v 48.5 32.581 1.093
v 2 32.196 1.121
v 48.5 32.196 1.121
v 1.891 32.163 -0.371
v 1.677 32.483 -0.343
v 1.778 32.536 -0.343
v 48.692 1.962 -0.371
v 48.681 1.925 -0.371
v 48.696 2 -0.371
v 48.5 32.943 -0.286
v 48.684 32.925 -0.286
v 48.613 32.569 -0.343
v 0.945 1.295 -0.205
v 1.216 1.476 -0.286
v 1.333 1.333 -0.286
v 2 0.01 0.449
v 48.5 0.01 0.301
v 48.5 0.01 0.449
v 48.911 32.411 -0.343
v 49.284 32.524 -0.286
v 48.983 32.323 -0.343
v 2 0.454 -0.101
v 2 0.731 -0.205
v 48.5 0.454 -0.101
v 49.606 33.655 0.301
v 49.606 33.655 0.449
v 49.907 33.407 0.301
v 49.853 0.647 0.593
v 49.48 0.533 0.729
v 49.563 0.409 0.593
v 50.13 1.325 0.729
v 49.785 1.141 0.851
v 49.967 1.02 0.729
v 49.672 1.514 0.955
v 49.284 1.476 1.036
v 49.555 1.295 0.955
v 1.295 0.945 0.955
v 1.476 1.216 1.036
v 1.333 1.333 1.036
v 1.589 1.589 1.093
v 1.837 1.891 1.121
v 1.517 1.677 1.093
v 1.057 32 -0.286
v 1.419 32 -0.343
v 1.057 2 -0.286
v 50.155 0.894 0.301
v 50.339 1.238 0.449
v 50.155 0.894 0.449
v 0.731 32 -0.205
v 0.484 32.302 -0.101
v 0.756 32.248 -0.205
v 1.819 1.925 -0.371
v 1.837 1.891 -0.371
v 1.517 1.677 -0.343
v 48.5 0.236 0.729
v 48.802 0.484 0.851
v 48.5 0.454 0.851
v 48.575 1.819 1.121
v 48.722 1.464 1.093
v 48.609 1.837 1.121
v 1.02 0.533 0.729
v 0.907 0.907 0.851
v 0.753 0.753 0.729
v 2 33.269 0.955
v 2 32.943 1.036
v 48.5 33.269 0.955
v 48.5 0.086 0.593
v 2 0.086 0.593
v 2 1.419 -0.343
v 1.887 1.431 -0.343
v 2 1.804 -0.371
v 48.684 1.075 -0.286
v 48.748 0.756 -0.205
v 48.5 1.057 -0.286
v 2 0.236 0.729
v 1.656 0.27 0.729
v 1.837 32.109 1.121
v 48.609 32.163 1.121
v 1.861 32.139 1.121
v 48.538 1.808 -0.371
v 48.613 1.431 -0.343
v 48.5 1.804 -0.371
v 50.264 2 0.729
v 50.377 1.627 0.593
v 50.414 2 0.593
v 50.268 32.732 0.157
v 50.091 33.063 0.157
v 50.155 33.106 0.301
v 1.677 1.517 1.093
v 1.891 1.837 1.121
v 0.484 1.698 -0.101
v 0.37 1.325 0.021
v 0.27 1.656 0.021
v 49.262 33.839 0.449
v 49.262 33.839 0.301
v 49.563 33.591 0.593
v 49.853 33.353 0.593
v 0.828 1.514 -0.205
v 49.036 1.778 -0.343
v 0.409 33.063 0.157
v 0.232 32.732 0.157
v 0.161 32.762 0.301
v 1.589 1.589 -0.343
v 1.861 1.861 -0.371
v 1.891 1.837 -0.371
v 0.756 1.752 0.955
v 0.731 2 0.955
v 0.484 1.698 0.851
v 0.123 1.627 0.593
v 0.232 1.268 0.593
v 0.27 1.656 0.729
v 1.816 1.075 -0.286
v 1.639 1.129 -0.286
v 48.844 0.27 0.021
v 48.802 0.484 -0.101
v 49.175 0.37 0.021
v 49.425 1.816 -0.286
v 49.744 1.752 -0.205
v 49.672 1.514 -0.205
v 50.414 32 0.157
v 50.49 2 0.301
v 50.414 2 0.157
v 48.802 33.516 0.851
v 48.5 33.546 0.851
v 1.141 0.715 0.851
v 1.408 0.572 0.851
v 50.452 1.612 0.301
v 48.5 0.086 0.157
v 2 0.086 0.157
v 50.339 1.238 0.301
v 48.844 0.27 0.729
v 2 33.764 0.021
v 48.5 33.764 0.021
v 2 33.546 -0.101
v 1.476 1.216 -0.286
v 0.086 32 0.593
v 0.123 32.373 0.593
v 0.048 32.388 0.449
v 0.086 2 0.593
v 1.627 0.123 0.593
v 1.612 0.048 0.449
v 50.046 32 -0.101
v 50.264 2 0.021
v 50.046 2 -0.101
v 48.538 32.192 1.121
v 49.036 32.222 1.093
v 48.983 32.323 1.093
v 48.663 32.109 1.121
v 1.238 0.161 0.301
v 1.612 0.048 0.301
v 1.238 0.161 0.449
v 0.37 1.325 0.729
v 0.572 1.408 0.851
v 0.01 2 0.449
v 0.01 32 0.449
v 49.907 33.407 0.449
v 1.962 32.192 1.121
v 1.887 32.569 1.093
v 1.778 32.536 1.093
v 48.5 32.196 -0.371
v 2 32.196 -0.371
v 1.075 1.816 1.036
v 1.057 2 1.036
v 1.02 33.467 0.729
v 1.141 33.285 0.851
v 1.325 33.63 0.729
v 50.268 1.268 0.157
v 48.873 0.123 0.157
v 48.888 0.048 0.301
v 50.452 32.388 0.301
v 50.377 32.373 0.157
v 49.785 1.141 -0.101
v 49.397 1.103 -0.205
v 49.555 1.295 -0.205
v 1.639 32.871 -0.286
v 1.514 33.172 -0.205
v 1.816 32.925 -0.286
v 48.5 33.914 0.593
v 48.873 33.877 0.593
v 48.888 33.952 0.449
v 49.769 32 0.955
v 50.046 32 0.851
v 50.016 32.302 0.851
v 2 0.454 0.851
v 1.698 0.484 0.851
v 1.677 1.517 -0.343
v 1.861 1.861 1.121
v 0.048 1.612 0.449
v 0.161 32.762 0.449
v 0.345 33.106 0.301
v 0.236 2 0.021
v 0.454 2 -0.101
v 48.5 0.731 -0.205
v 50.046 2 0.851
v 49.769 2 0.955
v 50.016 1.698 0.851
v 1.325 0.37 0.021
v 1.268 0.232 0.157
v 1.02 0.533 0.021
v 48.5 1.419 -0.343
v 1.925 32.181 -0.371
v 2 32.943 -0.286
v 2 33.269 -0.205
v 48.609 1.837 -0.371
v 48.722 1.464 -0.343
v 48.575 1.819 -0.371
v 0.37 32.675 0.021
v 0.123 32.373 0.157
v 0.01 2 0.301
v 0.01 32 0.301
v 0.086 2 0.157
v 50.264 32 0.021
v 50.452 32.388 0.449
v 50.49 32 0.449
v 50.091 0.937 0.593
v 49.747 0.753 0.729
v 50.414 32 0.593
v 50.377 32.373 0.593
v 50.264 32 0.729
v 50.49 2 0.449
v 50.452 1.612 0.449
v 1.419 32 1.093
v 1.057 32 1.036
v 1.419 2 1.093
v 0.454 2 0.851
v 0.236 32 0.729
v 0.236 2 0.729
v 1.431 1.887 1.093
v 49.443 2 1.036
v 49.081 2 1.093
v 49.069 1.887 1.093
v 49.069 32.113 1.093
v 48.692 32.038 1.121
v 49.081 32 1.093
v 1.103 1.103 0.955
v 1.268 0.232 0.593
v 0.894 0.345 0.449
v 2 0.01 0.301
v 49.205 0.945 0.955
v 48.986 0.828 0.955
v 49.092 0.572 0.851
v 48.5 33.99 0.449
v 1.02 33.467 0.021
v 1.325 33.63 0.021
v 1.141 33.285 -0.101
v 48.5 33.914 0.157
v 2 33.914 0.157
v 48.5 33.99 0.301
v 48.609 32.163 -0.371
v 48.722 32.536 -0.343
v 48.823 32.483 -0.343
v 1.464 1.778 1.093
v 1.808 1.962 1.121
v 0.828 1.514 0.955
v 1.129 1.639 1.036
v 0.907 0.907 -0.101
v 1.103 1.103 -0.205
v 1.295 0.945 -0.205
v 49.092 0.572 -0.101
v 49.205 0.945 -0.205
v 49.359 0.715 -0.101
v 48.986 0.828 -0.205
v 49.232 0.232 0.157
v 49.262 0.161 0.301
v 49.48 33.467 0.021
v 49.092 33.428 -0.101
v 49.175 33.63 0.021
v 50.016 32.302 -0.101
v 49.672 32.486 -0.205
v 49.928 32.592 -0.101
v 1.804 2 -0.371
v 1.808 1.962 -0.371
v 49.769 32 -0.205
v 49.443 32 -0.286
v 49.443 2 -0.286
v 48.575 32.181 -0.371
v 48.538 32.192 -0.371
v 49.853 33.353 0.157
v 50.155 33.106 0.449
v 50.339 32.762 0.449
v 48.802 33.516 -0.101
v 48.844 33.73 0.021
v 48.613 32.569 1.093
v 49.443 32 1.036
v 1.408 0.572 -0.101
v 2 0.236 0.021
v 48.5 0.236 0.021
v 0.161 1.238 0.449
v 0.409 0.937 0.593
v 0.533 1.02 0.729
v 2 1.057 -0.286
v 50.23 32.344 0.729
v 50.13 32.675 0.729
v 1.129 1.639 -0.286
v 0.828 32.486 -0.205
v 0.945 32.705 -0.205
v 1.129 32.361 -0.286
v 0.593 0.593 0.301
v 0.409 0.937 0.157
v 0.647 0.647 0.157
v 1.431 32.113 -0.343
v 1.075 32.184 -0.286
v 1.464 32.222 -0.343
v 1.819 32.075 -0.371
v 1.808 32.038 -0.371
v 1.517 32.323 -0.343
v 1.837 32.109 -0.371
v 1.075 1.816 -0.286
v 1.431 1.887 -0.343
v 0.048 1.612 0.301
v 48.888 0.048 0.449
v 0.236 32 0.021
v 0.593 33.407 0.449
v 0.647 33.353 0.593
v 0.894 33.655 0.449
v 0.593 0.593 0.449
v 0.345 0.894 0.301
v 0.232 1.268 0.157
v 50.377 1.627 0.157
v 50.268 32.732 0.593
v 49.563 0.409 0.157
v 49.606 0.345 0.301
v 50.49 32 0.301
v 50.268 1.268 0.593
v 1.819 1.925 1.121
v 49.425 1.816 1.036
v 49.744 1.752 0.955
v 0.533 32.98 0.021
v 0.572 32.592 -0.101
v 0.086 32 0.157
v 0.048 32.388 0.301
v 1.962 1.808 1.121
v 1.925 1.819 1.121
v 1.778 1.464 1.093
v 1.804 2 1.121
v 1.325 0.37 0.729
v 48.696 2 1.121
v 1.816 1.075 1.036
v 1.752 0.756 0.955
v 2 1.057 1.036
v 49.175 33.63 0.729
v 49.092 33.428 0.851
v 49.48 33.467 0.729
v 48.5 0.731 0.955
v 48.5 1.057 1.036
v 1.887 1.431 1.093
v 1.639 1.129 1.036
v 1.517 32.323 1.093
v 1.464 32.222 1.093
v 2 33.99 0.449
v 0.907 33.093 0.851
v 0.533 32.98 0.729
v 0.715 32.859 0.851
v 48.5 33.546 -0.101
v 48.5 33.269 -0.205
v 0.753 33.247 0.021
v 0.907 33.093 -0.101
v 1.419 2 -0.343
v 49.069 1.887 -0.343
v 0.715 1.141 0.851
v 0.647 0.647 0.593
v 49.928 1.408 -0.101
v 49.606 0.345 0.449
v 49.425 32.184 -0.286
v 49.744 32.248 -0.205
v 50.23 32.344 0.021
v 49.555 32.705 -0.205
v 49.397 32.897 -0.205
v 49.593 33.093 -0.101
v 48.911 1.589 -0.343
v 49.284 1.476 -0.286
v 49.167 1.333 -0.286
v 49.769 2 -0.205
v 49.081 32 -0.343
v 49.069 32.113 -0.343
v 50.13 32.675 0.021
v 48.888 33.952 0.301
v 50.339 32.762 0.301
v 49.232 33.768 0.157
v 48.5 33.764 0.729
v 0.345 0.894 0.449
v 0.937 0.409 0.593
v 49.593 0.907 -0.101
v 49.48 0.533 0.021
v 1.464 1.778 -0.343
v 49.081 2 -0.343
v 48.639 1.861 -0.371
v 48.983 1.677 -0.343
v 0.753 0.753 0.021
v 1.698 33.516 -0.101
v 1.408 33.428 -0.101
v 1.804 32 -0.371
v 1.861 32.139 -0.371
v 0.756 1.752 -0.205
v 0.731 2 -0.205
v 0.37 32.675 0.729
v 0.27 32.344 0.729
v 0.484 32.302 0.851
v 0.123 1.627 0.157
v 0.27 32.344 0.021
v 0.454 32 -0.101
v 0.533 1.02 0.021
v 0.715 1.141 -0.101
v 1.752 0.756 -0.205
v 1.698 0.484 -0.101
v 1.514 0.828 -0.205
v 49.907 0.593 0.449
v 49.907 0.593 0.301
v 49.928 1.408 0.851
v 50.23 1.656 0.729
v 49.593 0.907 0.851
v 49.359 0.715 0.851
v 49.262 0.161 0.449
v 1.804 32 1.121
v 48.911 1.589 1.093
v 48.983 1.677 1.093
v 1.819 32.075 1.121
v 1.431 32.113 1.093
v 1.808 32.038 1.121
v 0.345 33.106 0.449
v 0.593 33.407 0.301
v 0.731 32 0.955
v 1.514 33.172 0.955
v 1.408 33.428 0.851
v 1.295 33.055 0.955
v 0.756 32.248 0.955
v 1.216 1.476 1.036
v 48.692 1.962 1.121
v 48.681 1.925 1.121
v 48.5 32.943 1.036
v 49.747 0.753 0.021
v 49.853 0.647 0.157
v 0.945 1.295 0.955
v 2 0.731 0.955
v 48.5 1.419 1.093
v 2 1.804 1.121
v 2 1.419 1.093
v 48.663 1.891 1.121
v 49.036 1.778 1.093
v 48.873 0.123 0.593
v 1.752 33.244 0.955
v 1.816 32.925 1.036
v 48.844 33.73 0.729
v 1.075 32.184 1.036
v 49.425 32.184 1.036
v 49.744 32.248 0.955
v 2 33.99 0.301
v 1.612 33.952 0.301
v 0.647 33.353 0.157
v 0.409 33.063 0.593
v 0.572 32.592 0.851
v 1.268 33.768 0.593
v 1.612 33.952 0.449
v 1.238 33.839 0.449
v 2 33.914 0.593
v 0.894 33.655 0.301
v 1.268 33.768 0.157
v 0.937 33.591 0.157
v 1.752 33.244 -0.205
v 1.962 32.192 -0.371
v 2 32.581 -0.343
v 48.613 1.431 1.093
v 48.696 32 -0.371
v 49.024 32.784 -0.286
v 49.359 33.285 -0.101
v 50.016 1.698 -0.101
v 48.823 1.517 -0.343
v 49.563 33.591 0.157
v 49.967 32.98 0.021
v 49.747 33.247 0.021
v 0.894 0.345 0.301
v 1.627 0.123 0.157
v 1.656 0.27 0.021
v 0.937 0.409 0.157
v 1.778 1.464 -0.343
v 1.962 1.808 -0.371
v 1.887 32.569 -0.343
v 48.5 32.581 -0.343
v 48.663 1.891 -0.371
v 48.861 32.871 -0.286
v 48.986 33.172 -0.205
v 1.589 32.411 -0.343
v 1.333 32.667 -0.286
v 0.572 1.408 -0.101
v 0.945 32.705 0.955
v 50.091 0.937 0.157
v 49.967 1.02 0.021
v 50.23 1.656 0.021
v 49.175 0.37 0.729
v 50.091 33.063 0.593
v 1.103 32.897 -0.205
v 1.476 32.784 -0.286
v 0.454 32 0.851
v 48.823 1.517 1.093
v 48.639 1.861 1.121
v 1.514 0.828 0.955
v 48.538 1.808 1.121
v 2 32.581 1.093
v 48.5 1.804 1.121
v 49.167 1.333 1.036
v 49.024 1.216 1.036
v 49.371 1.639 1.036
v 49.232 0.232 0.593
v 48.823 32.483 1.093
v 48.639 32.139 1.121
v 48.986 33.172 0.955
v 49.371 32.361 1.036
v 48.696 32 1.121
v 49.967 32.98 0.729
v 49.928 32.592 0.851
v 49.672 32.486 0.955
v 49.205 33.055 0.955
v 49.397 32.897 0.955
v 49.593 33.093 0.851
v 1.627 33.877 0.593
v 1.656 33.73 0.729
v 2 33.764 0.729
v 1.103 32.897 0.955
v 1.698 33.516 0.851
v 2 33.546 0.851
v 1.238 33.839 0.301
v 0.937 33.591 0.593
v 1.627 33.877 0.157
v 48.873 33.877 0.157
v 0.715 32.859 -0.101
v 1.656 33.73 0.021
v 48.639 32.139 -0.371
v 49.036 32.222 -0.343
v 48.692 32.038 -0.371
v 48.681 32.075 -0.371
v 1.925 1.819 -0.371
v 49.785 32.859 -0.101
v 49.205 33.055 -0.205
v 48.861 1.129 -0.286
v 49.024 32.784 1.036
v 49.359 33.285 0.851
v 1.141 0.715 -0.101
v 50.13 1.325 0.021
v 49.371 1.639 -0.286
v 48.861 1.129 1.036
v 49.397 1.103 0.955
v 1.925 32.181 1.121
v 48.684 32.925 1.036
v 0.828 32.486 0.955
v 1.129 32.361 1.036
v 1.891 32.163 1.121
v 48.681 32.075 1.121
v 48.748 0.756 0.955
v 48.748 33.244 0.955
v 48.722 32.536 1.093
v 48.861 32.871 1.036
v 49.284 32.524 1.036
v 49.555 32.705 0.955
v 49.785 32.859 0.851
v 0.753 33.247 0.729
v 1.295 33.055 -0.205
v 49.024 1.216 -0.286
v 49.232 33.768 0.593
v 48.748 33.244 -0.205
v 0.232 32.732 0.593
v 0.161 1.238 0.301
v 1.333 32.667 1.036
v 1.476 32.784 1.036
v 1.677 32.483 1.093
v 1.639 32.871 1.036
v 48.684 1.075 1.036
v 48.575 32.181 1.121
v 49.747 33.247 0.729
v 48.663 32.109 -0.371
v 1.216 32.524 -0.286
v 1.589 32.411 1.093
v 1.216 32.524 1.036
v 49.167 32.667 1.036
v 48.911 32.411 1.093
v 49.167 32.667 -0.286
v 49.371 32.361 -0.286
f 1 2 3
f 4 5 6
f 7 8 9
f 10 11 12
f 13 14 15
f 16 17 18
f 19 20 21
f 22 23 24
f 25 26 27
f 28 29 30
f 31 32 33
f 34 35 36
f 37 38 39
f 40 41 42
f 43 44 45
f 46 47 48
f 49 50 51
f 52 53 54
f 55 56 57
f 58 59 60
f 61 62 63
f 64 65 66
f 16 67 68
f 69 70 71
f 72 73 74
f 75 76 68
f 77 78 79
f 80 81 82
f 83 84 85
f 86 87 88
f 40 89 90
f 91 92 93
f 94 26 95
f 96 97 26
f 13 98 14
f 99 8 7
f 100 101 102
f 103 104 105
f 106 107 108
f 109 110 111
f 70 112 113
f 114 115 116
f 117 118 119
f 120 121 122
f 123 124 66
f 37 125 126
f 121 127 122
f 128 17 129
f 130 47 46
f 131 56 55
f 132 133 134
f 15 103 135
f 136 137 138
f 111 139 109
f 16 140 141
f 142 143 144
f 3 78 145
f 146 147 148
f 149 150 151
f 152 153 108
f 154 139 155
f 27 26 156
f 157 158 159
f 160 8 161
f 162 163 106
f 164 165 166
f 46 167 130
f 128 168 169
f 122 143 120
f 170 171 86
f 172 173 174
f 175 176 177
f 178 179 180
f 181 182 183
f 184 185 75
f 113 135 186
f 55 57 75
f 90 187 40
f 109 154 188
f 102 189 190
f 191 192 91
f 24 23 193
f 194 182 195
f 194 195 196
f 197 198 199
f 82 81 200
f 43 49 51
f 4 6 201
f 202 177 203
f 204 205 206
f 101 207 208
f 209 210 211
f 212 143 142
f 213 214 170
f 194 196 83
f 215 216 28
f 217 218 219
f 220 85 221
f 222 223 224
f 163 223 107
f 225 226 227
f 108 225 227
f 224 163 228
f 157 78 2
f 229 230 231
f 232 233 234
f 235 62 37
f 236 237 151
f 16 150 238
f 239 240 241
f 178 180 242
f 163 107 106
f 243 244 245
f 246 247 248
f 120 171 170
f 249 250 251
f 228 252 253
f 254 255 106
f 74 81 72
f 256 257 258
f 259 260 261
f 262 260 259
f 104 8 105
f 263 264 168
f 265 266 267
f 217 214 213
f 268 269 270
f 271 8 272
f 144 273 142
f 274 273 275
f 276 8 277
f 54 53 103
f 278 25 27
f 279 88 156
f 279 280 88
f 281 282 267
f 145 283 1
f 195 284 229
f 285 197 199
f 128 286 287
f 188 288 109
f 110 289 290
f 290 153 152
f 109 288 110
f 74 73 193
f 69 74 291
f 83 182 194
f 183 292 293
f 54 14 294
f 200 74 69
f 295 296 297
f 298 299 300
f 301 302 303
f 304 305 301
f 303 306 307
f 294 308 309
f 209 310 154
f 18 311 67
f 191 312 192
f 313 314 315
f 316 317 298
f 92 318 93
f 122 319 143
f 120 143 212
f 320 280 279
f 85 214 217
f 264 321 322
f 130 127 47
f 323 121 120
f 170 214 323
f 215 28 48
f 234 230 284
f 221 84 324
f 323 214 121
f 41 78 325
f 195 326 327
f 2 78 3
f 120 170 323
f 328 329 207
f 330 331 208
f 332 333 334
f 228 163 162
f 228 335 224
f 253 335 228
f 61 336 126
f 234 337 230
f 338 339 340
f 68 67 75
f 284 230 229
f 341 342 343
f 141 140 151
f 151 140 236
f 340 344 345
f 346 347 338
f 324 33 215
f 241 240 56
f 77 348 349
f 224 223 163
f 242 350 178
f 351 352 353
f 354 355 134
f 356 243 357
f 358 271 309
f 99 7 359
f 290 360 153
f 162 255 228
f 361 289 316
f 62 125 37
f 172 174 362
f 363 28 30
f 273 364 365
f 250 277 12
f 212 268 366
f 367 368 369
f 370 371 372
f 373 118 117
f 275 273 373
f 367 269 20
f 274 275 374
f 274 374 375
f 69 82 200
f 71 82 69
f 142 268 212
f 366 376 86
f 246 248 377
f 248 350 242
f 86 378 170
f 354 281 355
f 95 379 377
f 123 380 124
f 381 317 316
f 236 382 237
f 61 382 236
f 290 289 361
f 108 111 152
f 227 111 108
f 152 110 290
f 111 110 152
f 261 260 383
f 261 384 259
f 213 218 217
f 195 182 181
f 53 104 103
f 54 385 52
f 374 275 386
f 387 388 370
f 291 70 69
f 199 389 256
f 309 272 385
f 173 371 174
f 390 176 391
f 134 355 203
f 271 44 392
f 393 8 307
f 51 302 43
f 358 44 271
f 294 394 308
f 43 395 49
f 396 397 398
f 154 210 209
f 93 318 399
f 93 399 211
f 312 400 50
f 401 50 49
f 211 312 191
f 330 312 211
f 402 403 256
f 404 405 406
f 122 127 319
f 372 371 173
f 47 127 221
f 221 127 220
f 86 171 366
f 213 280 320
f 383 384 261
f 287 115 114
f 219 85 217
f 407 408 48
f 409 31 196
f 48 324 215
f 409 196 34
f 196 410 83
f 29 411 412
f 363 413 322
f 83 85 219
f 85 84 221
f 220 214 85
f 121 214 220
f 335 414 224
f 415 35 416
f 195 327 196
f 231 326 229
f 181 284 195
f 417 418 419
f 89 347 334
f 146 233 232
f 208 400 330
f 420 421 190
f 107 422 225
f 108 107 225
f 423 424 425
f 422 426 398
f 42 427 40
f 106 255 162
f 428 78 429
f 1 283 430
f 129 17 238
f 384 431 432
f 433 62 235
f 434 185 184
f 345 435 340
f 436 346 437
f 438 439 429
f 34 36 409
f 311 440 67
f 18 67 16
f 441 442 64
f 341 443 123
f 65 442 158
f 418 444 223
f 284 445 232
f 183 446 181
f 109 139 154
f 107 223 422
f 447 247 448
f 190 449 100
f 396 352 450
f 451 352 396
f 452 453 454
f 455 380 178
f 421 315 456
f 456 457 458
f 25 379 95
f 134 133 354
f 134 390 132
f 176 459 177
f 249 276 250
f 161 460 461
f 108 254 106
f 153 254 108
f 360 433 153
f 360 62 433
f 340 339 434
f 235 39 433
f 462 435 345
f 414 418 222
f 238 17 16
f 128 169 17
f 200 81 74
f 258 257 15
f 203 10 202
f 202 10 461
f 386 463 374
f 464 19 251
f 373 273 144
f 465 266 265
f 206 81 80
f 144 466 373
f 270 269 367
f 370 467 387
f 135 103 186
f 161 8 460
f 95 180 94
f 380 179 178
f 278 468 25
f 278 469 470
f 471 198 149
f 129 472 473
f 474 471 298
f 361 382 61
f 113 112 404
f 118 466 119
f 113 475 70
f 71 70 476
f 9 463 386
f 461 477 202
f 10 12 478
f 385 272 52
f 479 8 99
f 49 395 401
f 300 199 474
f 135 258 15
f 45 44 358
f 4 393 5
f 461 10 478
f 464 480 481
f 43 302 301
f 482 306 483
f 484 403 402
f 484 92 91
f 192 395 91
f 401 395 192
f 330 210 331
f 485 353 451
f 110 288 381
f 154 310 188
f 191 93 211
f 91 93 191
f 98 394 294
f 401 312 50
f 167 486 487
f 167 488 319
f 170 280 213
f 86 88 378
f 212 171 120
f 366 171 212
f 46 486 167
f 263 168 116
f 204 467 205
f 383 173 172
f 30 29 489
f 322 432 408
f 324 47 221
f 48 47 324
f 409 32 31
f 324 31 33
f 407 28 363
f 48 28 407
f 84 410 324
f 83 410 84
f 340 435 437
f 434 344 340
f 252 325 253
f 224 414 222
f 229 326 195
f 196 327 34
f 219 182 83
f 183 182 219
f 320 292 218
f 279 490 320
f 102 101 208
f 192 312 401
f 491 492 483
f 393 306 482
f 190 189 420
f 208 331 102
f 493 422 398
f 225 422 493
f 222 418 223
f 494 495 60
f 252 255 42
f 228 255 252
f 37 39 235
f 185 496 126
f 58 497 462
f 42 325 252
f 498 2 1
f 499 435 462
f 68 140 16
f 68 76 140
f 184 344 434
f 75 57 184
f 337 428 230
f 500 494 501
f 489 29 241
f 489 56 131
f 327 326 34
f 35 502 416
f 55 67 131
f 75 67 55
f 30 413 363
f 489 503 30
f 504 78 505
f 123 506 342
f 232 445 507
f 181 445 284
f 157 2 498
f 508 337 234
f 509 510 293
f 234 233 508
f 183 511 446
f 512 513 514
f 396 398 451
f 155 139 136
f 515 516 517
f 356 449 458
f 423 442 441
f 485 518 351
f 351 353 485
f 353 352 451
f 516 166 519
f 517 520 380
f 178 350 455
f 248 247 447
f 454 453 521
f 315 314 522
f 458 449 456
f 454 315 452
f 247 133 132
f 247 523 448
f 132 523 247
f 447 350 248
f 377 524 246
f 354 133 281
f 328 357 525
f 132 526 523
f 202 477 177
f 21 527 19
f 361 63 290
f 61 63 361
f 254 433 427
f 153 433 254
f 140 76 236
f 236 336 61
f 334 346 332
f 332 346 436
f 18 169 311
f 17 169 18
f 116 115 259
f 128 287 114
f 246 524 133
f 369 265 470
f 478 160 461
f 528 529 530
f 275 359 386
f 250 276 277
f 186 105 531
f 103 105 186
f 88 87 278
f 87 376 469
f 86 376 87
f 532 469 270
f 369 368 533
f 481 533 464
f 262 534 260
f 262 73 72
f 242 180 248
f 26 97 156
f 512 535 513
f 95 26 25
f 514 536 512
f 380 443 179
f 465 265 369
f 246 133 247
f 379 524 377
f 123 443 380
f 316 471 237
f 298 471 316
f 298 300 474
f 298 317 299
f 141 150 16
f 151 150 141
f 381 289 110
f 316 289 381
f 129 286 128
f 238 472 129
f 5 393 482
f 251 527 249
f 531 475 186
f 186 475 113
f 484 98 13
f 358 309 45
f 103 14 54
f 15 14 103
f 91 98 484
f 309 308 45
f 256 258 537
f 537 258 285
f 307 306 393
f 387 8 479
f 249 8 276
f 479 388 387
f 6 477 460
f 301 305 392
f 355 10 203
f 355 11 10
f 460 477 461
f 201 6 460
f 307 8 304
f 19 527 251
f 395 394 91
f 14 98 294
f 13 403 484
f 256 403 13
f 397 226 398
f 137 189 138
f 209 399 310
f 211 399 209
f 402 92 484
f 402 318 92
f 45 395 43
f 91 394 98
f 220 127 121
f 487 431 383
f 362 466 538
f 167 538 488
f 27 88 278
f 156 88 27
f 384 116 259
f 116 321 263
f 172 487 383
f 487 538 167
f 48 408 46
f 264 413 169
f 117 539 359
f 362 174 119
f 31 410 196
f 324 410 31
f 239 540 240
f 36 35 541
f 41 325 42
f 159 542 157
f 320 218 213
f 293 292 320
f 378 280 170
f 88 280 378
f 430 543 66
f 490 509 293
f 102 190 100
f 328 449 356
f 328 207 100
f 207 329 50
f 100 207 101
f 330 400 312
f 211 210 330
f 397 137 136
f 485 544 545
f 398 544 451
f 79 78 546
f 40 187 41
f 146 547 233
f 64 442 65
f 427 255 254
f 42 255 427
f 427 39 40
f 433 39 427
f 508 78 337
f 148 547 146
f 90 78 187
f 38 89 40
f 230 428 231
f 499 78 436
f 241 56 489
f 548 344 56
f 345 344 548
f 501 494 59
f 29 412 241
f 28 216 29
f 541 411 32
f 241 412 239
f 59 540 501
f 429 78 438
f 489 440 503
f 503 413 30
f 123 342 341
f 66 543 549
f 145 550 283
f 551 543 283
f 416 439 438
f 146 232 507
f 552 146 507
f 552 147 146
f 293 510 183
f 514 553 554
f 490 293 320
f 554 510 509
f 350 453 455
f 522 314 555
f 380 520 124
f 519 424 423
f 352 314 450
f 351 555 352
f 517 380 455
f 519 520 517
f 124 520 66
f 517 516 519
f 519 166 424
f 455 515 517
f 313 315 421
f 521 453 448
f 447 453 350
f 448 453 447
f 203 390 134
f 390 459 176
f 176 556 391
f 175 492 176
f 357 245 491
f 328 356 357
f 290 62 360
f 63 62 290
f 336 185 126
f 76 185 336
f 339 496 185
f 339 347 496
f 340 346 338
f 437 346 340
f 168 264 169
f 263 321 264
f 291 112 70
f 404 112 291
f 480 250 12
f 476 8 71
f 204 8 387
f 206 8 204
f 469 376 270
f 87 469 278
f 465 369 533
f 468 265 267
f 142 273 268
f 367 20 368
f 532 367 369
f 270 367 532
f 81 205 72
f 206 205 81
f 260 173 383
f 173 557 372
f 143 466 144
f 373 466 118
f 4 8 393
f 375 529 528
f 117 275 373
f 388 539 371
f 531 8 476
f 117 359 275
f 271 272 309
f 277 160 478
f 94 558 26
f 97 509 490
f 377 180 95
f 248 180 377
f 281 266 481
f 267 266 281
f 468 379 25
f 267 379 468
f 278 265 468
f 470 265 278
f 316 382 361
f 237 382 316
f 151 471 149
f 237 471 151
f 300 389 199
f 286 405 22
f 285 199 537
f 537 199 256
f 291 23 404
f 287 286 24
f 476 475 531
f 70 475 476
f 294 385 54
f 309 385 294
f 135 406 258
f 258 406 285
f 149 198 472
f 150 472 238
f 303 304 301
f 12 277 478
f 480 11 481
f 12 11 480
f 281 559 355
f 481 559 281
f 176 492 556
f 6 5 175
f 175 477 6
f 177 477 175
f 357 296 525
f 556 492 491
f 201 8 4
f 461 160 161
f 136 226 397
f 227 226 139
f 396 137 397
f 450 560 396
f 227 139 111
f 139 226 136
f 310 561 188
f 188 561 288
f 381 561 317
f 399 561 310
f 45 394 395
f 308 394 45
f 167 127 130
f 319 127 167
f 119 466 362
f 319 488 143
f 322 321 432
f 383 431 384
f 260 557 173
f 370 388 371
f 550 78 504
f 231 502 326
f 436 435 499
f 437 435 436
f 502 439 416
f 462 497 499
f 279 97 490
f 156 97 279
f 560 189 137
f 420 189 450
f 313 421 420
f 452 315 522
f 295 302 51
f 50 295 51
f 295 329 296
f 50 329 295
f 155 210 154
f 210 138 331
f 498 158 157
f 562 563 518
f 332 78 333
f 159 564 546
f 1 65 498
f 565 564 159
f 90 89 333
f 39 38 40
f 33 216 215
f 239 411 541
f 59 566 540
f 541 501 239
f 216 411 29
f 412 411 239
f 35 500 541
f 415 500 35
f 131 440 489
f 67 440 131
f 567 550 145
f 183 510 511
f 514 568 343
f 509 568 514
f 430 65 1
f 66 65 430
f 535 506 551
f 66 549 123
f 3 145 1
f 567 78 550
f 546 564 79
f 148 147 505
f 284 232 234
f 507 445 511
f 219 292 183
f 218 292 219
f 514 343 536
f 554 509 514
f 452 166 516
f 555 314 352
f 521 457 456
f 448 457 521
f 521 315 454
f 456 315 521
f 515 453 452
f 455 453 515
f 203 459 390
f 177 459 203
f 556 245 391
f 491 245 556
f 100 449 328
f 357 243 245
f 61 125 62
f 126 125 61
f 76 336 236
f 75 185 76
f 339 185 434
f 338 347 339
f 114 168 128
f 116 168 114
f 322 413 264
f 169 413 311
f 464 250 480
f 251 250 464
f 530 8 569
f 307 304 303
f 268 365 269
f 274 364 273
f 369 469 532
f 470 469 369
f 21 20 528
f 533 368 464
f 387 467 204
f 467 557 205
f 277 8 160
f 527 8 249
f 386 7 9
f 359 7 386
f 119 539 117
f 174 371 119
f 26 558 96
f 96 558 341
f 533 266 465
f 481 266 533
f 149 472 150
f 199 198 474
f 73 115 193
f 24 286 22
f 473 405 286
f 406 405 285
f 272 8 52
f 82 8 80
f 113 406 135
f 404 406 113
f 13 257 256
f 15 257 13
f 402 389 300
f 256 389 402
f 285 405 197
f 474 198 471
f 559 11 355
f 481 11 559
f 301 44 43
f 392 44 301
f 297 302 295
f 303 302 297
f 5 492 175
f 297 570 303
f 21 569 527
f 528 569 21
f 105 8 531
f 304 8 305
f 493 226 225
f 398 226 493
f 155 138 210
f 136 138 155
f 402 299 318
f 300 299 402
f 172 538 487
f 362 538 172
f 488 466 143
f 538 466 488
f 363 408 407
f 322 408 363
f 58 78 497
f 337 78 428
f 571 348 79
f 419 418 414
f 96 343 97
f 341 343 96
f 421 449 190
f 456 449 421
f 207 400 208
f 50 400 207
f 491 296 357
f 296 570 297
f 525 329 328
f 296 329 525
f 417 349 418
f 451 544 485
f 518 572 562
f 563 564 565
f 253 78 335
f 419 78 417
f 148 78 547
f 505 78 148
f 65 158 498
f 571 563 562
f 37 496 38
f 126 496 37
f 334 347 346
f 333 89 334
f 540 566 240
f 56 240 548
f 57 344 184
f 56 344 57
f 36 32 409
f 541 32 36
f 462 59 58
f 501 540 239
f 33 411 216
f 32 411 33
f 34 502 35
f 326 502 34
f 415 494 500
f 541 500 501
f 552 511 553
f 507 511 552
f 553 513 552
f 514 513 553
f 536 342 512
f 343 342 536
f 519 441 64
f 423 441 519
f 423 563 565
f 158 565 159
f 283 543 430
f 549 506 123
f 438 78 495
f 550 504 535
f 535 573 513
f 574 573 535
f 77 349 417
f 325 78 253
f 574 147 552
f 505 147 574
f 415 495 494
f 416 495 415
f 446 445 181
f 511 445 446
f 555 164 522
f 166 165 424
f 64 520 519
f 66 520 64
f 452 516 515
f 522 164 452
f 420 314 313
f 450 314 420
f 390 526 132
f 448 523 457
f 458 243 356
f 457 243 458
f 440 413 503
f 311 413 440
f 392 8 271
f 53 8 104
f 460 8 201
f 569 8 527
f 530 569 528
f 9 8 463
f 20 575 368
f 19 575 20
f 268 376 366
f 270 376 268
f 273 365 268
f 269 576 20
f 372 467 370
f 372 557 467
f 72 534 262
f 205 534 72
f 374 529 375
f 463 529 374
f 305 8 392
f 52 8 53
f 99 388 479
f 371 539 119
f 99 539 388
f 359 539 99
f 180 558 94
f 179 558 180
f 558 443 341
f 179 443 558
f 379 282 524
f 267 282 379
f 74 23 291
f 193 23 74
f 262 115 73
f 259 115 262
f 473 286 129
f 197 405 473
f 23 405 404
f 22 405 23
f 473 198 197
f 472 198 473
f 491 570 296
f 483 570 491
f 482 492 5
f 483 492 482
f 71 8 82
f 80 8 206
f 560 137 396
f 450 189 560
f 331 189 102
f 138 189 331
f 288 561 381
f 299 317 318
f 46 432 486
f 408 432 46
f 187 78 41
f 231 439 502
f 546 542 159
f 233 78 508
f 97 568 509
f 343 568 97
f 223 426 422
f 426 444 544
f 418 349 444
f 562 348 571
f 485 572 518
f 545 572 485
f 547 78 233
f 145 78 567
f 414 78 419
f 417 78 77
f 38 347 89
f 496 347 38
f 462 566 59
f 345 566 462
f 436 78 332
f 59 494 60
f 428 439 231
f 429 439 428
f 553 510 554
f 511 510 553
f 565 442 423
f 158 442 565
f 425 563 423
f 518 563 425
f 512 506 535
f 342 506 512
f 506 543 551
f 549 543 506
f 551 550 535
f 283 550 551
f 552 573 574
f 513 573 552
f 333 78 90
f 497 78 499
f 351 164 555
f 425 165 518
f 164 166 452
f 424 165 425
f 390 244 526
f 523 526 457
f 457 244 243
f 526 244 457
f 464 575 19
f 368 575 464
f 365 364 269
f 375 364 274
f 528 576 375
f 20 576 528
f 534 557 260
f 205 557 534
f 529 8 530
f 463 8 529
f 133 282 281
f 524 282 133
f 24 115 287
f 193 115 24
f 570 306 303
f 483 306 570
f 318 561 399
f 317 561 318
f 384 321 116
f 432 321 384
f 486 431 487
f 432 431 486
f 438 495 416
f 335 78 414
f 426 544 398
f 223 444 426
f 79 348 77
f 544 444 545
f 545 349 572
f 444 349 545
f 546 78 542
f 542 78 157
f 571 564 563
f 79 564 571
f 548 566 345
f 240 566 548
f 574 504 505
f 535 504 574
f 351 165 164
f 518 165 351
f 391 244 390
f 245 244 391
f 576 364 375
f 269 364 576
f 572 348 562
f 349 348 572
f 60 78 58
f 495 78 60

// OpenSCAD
//include <ymse.scad>

$fn = 32;

x = 50.5;
y = 34;
z = 1.5;
r1 = 2;
r2 = 2;
chamfer = 1;
use_chamfer = 0;

if (use_chamfer) {
    hull() 
    {
        linear_extrude(.5)  {
            translate([r1,r1,r1]) circle (r1);
            translate([x-r1,r1,r1]) circle (r1);
            translate([r2,y-r2,r2]) circle (r2);
            translate([x-r2,y-r2,r2]) circle (r2);
        }
        translate([0,0,1]) {
            linear_extrude(.5)  {
                translate([r1+chamfer,r1+chamfer,r1]) circle (r1);
                translate([x-r1-chamfer,r1+chamfer,r1]) circle (r1);
                translate([r2+chamfer,y-r2-chamfer,r2]) circle (r2);
                translate([x-r2-chamfer,y-r2-chamfer,r2]) circle (r2);
            }
        }
    }
} else {
    scale([1,1,.75])  {
        hull() {
            my_z = 1/r1;
            translate([r1,r1,my_z]) scale([1,1,my_z]) sphere (r1);
            translate([x-r1,r1,my_z]) scale([1,1,my_z]) sphere (r1);
            translate([r1,y-r1,my_z]) scale([1,1,my_z]) sphere (r1);
            translate([x-r1,y-r1,my_z]) scale([1,1,my_z]) sphere (r1);
        }
    }
}
